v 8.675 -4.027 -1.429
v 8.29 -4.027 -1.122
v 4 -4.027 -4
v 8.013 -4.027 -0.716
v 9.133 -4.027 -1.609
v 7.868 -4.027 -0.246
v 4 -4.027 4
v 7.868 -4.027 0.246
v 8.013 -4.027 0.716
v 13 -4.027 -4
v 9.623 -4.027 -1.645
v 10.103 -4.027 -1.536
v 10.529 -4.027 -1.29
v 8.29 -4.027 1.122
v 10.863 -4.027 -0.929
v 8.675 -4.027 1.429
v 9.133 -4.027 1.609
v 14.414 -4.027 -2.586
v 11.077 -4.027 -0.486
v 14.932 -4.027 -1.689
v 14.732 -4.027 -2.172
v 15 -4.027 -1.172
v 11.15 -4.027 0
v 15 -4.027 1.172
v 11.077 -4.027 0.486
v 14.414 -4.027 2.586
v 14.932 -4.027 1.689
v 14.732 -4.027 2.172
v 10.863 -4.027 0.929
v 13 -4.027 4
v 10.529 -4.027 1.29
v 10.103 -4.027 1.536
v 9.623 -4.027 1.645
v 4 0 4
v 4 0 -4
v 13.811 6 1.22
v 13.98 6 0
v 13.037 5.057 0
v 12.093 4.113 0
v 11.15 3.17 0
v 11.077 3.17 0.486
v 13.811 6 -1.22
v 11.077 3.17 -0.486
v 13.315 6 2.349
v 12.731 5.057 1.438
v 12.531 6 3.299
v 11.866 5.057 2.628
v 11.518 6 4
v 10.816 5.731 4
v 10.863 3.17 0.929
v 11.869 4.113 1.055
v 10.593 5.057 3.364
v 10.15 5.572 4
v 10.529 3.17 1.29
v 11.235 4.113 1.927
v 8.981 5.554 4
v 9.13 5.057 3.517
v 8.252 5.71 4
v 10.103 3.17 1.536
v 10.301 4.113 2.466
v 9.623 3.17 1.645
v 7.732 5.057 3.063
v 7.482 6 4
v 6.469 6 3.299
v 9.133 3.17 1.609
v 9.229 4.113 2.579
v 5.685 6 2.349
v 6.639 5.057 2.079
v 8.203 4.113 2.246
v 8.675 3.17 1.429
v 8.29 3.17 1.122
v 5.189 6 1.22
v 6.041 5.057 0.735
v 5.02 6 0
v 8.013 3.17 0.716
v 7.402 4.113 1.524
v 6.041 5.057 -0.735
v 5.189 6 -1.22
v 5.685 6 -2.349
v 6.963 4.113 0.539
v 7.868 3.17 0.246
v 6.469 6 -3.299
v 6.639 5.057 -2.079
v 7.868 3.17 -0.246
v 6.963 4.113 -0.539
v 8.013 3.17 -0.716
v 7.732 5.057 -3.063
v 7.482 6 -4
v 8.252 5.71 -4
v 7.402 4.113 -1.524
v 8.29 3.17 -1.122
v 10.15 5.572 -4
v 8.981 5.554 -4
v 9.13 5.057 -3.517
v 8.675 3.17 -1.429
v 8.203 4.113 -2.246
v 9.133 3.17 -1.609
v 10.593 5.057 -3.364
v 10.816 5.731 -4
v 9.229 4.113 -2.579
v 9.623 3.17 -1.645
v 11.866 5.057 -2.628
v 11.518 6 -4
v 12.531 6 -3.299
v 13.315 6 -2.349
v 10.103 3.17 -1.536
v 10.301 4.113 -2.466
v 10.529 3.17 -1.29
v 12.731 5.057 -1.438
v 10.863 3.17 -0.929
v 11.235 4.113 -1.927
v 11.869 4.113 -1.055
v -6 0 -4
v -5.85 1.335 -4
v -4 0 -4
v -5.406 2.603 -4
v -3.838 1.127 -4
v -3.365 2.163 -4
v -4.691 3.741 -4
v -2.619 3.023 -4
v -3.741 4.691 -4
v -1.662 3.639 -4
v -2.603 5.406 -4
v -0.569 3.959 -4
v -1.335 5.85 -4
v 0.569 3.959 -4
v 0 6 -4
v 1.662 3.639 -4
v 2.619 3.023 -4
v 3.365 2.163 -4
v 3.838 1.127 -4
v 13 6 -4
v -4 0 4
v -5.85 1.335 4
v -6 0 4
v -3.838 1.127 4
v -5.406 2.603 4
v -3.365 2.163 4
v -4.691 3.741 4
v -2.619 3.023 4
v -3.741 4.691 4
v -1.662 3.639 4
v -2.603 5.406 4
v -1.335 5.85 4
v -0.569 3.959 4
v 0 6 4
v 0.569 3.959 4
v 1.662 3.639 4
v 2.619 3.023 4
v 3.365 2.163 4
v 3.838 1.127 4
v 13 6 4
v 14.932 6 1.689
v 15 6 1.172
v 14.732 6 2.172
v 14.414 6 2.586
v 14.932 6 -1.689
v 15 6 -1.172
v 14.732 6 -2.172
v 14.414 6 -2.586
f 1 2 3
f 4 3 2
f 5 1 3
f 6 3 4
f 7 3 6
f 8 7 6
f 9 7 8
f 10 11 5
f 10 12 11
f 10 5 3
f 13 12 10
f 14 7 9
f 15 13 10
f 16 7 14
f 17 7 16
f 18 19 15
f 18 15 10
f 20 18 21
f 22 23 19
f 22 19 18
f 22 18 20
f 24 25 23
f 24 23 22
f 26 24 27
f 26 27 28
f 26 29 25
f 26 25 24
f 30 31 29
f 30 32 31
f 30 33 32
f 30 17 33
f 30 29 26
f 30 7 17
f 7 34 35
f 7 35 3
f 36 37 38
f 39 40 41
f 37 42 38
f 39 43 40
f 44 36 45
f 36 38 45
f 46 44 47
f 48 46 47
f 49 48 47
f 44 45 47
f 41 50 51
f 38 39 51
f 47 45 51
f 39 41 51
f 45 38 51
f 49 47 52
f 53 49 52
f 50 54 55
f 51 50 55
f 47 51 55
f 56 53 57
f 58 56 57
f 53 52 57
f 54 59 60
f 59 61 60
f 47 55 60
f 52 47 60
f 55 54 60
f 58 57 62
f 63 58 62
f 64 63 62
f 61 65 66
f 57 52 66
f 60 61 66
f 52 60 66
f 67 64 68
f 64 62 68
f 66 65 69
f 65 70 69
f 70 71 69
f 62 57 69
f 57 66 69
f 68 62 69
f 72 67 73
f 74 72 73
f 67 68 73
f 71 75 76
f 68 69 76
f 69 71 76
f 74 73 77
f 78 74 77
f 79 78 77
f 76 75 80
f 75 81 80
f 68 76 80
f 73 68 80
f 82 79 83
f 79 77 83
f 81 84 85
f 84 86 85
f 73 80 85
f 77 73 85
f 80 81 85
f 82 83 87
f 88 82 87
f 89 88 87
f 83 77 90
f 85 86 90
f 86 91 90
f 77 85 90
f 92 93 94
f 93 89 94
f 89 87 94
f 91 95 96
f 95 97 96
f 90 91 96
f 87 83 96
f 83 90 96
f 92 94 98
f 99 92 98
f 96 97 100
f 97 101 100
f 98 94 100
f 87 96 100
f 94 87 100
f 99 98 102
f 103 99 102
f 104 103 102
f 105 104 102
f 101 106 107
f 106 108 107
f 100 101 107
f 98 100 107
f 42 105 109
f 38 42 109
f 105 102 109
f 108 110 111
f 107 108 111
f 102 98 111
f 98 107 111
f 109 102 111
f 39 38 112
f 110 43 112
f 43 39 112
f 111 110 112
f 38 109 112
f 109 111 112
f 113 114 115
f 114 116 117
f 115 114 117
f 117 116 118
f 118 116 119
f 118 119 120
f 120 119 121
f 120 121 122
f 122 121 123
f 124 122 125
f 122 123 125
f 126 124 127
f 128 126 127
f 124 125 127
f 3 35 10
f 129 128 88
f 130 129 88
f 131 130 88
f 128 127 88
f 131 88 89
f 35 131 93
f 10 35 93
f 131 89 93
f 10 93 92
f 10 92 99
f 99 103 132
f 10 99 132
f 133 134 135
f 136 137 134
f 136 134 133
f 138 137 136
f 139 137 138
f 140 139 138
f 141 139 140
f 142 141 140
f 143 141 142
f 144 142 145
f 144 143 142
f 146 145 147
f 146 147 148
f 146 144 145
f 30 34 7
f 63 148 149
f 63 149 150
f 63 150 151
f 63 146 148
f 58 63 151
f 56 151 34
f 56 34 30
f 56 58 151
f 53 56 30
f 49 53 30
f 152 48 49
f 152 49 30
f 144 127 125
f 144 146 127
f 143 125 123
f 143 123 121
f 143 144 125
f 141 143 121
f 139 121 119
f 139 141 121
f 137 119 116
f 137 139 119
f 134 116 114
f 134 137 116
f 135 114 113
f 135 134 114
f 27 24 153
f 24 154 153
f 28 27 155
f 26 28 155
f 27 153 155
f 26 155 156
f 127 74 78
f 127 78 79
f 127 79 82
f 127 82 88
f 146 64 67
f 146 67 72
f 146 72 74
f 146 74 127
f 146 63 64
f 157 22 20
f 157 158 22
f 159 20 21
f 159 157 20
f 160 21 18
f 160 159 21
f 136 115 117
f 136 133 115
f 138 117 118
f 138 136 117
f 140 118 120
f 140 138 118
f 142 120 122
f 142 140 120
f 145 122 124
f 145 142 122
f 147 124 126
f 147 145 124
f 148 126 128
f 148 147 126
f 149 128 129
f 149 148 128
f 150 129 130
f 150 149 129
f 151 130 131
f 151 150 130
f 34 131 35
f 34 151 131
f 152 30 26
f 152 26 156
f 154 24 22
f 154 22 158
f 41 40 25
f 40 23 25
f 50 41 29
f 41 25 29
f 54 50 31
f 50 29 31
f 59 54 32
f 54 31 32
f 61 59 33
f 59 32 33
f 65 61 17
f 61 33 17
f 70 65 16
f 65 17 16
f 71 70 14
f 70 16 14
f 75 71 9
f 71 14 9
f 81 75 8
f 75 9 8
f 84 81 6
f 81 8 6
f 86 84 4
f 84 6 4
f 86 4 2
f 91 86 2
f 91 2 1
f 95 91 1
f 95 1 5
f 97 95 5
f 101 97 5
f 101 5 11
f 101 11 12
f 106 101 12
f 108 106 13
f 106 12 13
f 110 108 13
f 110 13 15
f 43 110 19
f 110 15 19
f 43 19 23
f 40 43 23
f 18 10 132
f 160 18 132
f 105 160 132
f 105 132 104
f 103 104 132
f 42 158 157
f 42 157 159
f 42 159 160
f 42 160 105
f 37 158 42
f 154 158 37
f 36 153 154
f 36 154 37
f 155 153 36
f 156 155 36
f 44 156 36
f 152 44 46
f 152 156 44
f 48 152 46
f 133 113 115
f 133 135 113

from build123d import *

# Parameters (mm, degrees)
F1_DEPTH       = 4
F3_D           = 3.3
F3_CSINK_D     = 8.96
F3_CSINK_ANGLE = 90
F4_SIZE        = 2
F5_R           = 2


with BuildPart() as f1:
    # F0 (on Top) → F1 (new body, symmetric)
    with BuildSketch(Plane.XY):
        with BuildLine():
            ThreePointArc((-4, 0), (0, 4), (4, 0))
            Line((4, 0), (4, -4.0273182094))
            Line((4, -4.0273182094), (15, -4.0273182094))
            Line((15, -4.0273182094), (15, 6))
            Line((15, 6), (0, 6))
            ThreePointArc((0, 6), (-4.2426406871, 4.2426406871), (-6, 0))
            Line((-6, 0), (-4, 0))
        make_face()
    extrude(amount=F1_DEPTH, both=True)

    # F3 (through all)
    with Locations(Plane(origin=(0, 6, 0), x_dir=(-1, 0, 0), z_dir=(0, 1, 0))):
        with Locations((-9.5, 0)):
            CounterSinkHole(F3_D / 2, F3_CSINK_D / 2, counter_sink_angle=F3_CSINK_ANGLE)

    # F4
    f4_edges = [f1.edges().sort_by_distance(p)[0] for p in [
        (15, 0.986341, -4),
        (15, 0.986341, 4),
    ]]
    chamfer(f4_edges, length=F4_SIZE)

    # F5
    f5_edges = [f1.edges().sort_by_distance(p)[0] for p in [
        (15, 0.986341, -2),
        (15, 0.986341, 2),
    ]]
    fillet(f5_edges, radius=F5_R)


solid = f1.part
